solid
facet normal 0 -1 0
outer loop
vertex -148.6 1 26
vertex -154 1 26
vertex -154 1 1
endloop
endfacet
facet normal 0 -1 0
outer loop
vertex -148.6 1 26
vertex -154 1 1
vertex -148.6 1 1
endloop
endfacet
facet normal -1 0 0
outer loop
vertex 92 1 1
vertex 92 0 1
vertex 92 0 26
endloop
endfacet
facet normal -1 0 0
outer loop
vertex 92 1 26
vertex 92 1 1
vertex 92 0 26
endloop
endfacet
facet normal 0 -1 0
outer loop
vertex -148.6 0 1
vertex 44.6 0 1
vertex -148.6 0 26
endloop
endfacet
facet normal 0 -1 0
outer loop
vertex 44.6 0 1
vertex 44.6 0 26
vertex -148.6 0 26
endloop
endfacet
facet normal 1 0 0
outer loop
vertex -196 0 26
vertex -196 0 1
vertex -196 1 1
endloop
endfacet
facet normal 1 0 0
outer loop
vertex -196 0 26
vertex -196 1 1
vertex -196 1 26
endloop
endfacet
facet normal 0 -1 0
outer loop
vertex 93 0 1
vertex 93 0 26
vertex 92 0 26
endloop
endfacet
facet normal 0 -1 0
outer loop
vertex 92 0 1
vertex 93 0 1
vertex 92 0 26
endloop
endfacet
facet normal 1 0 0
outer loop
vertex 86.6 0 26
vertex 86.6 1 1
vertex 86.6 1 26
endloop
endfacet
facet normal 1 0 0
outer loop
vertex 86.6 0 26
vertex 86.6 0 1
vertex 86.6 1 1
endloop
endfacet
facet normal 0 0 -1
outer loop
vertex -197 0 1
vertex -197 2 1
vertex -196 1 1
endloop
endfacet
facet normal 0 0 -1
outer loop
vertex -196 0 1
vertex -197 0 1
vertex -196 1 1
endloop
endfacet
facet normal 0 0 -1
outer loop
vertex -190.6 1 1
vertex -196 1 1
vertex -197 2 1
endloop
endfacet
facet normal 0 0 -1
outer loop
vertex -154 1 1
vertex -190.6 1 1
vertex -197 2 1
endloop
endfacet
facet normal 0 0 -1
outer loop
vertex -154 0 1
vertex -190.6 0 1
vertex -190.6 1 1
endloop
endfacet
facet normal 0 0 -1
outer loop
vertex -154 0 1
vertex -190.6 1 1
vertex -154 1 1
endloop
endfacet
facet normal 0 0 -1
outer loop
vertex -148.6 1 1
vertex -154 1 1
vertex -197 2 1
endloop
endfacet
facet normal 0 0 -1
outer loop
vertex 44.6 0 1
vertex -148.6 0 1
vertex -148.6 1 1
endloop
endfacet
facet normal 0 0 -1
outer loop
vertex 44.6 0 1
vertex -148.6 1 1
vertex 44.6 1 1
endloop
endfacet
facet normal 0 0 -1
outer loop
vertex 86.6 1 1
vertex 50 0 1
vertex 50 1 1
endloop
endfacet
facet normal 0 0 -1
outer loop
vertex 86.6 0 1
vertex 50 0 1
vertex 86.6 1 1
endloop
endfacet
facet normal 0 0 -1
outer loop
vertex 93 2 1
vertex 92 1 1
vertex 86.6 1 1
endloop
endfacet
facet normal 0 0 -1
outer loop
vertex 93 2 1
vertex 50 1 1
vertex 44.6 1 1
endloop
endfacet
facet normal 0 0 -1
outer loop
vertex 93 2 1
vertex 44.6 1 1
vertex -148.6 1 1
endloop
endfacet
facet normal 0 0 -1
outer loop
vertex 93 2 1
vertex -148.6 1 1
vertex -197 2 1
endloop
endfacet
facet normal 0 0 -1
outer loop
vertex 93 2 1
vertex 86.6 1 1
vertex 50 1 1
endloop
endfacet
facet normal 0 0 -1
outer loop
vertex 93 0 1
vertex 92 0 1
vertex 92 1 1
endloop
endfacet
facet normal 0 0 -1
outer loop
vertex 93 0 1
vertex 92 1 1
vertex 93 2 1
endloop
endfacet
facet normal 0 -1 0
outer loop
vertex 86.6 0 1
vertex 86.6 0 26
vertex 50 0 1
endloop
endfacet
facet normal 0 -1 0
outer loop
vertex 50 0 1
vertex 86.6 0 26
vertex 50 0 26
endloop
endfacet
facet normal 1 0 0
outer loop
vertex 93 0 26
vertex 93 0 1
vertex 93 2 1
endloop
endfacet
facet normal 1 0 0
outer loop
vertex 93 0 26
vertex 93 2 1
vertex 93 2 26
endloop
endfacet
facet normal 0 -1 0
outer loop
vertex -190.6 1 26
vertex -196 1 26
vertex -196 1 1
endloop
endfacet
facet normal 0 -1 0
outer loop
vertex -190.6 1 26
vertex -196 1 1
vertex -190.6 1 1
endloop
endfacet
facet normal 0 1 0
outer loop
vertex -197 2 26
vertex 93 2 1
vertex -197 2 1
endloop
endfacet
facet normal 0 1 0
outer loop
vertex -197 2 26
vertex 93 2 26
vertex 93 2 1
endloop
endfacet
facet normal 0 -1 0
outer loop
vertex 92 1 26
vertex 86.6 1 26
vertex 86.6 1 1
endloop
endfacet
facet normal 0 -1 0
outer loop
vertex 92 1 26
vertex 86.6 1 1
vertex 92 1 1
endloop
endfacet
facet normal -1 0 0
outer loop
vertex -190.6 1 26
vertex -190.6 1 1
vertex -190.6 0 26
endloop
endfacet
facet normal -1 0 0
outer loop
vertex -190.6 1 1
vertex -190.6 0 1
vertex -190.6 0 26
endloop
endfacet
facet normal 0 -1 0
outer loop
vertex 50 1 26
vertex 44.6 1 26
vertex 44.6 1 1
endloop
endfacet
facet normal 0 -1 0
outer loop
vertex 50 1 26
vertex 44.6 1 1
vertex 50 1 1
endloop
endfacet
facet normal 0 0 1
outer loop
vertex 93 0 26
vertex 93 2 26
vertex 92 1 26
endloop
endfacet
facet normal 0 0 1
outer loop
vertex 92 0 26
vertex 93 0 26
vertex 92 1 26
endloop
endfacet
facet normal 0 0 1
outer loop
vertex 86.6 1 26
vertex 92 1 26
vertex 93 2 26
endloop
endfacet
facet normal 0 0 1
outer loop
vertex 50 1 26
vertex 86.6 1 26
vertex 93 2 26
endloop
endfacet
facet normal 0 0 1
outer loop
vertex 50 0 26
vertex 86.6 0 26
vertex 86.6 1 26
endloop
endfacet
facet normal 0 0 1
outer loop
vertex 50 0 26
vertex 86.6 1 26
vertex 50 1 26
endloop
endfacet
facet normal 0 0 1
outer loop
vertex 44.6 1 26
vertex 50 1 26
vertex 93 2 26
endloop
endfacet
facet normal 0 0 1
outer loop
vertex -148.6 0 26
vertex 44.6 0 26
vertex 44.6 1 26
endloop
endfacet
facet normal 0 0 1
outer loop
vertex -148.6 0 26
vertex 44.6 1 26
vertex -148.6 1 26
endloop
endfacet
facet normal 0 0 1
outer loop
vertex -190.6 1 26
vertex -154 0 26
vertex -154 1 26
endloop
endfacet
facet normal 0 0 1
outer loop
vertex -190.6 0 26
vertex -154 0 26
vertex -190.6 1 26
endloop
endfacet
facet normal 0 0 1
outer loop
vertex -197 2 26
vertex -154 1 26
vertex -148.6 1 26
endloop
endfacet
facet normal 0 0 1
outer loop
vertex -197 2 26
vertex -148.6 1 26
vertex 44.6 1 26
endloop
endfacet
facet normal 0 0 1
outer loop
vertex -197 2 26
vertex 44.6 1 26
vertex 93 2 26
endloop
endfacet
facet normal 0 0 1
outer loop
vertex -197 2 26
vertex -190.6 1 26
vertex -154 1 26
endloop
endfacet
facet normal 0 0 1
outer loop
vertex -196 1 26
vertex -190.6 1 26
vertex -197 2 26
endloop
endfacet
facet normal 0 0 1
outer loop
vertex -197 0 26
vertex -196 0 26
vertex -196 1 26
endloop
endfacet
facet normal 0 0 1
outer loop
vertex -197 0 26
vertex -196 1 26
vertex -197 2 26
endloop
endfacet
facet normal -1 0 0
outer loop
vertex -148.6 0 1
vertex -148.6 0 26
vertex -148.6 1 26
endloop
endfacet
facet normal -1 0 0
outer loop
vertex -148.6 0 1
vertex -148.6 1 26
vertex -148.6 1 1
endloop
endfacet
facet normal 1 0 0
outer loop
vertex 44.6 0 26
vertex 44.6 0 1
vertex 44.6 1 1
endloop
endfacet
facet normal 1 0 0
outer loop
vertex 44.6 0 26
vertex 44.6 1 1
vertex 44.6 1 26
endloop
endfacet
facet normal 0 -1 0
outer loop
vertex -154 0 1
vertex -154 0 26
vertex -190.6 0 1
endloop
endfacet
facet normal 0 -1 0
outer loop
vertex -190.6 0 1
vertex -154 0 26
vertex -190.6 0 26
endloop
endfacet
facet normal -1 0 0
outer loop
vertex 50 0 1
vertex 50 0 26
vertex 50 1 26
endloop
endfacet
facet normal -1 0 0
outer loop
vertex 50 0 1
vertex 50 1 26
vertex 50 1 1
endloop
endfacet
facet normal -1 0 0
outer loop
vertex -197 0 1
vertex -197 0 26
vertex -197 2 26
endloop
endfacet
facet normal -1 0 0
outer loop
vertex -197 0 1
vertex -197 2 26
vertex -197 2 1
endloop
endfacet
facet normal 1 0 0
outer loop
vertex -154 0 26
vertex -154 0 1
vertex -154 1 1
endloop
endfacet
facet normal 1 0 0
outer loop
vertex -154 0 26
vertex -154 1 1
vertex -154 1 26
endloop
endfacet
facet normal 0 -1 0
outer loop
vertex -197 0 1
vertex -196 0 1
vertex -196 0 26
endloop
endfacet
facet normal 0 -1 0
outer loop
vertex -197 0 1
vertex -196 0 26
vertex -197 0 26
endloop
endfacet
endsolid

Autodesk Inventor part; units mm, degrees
ref_plane "YZ Plane" through (0, 0, 0) normal (1, 0, 0) x (0, 1, 0)
ref_plane "XZ Plane" through (0, 0, 0) normal (0, 1, 0) x (-1, 0, 0)
ref_plane "XY Plane" through (0, 0, 0) normal (0, 0, 1) x (1, 0, 0)
sketch "스케치1" plane through (0, 0, 0) normal (0, 1, 0) x (-1, 0, 0)
  line L0 (197, 1) -> (-93, 1)
  line L1 (-93, 1) -> (-93, 26)
  line L2 (-93, 26) -> (197, 26)
  line L3 (197, 26) -> (197, 1)
  point P0 (0, 0)
  dimension "d0" = 290
  dimension "d1" = 25
extrude "돌출1" add sketch "스케치1" along normal blind 2
sketch "스케치2" plane through (0, 0, 0) normal (0, -1, 0) x (1, 0, 0)
  line L0 (-197, 26) -> (93, 26) projected
  line L1 (93, 1) -> (-197, 1) projected
  line L2 (-154, 26) -> (-148.6, 26)
  line L3 (-148.6, 26) -> (-148.6, 1)
  line L4 (-148.6, 1) -> (-154, 1)
  line L5 (-154, 1) -> (-154, 26)
  line L6 (44.6, 26) -> (50, 26)
  line L7 (50, 26) -> (50, 1)
  line L8 (50, 1) -> (44.6, 1)
  line L9 (44.6, 1) -> (44.6, 26)
  line L10 (-197, 26) -> (-197, 1) projected
  line L11 (93, 1) -> (93, 26) projected
  point P0 (0, 0)
  dimension "d4" = 5.4
  dimension "d5" = 5.4
  dimension "d6" = 43
  dimension "d7" = 43
extrude "돌출2" cut sketch "스케치2" against normal blind 1 contours L0 L3 L1 L5 | L0 L7 L1 L9
sketch "스케치3" plane through (0, 0, 0) normal (0, -1, 0) x (1, 0, 0)
  line L0 (50, 26) -> (50, 1) projected
  line L1 (50, 1) -> (93, 1) projected
  line L2 (93, 1) -> (93, 26) projected
  line L3 (93, 26) -> (50, 26) projected
  line L4 (-154, 1) -> (-154, 26) projected
  line L5 (-154, 26) -> (-197, 26) projected
  line L6 (-197, 26) -> (-197, 1) projected
  line L7 (-197, 1) -> (-154, 1) projected
  line L8 (50, 1) -> (93, 1) projected
  line L9 (92, 1) -> (92, 26)
  line L10 (86.6, 1) -> (86.6, 26)
  line L11 (-196, 1) -> (-196, 26)
  line L12 (93, 1) -> (-197, 1) projected
  line L13 (-190.6, 1) -> (-190.6, 26)
  point P0 (0, 0)
  dimension "d10" = 1
  dimension "d11" = 5.4
  dimension "d12" = 1
  dimension "d13" = 5.4
extrude "돌출3" cut sketch "스케치3" against normal blind 1 contours L3 L9 L1 L10 | L7 L11 L5 L13
properties part number "앞판_중간" material "알루미늄 6061"
